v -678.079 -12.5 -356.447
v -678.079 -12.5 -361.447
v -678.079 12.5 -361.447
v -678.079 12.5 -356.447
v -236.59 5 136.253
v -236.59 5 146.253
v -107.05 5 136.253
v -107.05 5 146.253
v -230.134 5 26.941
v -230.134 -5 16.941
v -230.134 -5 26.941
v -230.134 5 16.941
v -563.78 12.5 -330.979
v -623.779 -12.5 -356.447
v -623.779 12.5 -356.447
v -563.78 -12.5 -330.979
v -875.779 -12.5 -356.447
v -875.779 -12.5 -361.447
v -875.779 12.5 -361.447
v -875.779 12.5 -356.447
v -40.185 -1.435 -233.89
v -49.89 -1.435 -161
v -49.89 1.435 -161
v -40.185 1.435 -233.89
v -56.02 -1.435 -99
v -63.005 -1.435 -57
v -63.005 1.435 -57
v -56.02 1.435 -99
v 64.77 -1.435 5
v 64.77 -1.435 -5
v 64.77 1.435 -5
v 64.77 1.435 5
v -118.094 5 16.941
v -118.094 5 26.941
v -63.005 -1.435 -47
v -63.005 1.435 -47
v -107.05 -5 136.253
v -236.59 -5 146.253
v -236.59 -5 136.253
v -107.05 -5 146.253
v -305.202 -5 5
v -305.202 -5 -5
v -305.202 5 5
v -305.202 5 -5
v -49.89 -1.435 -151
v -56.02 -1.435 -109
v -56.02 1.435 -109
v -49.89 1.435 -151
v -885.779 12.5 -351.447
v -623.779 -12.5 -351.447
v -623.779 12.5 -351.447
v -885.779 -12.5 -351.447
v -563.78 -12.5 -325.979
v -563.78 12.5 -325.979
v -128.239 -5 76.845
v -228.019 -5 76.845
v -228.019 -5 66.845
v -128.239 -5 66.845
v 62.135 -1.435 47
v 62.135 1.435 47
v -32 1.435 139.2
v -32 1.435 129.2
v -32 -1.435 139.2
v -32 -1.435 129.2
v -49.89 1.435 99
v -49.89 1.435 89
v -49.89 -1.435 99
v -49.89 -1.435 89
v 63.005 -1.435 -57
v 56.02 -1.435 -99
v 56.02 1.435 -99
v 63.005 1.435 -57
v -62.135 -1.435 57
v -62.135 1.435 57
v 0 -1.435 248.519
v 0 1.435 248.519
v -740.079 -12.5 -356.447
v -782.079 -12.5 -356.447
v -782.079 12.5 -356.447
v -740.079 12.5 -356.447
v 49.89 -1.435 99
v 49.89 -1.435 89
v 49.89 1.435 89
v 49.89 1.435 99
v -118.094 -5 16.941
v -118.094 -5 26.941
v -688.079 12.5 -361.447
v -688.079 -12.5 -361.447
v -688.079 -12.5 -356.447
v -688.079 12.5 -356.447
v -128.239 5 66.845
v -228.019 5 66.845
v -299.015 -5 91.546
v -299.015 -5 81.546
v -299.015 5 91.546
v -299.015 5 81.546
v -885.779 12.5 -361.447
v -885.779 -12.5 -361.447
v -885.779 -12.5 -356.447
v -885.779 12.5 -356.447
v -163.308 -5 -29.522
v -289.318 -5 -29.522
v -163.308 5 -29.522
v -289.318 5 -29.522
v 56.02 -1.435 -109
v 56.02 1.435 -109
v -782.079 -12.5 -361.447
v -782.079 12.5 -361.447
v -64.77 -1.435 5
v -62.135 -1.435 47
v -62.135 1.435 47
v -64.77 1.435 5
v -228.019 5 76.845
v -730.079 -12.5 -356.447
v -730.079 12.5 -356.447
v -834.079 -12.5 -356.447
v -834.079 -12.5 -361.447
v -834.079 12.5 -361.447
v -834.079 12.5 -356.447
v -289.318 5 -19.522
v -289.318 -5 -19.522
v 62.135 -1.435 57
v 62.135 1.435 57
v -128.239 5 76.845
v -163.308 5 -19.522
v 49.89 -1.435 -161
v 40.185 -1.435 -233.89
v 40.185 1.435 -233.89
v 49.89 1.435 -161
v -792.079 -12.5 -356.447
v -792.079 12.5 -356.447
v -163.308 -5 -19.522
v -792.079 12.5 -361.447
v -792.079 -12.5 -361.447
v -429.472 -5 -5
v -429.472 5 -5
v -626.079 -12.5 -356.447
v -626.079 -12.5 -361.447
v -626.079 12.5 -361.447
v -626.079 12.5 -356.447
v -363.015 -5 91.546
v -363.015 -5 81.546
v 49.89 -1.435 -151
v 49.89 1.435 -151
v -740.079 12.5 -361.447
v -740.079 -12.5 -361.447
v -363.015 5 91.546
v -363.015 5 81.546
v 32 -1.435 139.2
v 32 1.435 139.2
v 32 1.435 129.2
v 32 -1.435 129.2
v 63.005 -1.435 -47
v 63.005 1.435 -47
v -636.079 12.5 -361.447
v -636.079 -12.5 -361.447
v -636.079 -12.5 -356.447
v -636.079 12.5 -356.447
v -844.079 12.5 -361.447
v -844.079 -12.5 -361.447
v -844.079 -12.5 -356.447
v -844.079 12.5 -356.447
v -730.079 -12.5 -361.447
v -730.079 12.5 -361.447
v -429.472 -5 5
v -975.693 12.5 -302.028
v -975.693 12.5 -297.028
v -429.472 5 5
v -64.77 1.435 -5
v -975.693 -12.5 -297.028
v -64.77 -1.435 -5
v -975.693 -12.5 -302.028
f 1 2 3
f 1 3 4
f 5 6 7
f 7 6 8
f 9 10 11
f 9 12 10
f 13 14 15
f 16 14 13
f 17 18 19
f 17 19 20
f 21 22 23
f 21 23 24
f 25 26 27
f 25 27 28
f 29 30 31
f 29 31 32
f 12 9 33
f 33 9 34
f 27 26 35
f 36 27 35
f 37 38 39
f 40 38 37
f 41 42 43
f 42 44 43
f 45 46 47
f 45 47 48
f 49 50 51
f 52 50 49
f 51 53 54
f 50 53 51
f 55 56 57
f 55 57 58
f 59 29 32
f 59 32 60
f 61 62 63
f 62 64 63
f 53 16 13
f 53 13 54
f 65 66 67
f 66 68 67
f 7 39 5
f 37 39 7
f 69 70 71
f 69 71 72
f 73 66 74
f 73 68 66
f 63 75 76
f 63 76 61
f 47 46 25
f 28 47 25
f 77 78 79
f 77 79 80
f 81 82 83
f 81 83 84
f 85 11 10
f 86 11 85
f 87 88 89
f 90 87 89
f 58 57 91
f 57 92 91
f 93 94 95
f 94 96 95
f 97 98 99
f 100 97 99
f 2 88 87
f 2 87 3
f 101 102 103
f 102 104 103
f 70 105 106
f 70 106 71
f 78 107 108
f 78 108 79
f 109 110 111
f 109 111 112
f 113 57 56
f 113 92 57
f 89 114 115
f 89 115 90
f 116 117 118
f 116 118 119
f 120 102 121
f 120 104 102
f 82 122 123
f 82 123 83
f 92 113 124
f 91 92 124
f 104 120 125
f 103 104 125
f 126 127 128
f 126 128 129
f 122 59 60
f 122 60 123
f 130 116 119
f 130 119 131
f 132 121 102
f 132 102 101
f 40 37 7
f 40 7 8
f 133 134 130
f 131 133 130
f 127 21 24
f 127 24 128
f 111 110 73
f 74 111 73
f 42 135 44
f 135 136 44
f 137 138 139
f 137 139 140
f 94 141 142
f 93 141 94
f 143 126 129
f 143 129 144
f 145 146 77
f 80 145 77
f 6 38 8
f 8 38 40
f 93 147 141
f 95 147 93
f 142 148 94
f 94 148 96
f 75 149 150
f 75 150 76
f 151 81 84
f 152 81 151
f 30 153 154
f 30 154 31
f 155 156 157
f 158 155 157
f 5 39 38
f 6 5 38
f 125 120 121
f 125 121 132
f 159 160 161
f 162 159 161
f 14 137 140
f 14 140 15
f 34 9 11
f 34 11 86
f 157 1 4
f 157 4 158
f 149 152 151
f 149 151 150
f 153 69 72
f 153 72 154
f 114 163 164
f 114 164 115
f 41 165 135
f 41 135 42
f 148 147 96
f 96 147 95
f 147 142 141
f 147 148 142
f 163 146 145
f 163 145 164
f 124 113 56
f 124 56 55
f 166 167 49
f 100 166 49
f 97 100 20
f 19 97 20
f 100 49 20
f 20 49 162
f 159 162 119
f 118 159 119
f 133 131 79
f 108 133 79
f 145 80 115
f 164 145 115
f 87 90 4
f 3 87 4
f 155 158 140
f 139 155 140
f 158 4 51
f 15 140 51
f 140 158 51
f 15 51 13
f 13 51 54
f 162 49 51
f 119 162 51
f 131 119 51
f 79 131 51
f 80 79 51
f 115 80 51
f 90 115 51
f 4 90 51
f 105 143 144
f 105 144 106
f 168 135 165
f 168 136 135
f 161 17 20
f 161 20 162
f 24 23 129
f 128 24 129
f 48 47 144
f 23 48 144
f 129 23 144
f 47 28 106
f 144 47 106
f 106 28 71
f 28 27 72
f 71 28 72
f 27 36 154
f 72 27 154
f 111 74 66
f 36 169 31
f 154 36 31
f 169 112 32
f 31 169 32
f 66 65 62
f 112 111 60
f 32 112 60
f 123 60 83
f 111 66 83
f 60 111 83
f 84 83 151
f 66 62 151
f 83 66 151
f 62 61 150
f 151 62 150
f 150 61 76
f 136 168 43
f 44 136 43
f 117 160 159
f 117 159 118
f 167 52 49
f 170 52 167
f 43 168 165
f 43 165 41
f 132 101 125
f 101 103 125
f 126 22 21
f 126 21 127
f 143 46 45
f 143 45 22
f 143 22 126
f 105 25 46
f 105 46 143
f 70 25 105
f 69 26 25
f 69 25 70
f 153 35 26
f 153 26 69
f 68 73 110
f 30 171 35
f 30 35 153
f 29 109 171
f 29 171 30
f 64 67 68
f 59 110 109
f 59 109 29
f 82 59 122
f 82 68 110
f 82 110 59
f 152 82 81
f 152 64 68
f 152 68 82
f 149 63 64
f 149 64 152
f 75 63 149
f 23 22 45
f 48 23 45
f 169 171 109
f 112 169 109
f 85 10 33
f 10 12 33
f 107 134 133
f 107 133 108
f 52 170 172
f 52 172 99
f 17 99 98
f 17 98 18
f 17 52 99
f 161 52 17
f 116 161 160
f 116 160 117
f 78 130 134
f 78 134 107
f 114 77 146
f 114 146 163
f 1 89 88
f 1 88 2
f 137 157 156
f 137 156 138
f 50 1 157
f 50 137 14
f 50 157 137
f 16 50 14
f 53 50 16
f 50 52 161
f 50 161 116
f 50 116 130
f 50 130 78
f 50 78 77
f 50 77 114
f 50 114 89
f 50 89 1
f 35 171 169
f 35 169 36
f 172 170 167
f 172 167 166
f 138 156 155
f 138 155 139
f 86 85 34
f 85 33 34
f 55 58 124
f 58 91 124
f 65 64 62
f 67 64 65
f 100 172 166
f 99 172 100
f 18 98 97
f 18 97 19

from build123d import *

# Parameters (mm, degrees)
F0_W     = 126.01
F0_H     = 10
F0_W_2   = 64
F0_W_3   = 124.27
F0_W_4   = 112.04
F0_W_5   = 99.78
F0_W_6   = 129.54
F1_DEPTH = 5
F2_DEPTH = 1.435
F0_W_7   = 10
F0_H_2   = 5
F3_DEPTH = 12.5


with BuildPart() as f1:
    # F0 (on Front) → F1 (new body, symmetric)
    with BuildSketch(Plane.XZ):
        with Locations((-226.313189, -24.522368)):
            Rectangle(F0_W, F0_H)
        with Locations((-331.014579, 86.545763)):
            Rectangle(F0_W_2, F0_H)
        with Locations((-367.336839, 0)):
            Rectangle(F0_W_3, F0_H)
        with Locations((-174.114093, 21.940574)):
            Rectangle(F0_W_4, F0_H)
        with Locations((-178.129405, 71.845211)):
            Rectangle(F0_W_5, F0_H)
        with Locations((-171.819627, 141.252816)):
            Rectangle(F0_W_6, F0_H)
    extrude(amount=F1_DEPTH, both=True)


with BuildPart() as f2:
    # F0 (on Front) → F2 (new body, symmetric)
    with BuildSketch(Plane.XZ):
        Polygon((-49.89, 89), (-62.135, 57), (62.135, 57), (49.89, 89), align=None)
        Polygon((0, 248.519108), (-32, 139.2), (32, 139.2), align=None)
        Polygon((-32, 129.2), (-49.89, 99), (49.89, 99), (32, 129.2), align=None)
        with Locations((0, 134.2)):
            Rectangle(F0_W_2, F0_H)
        with Locations((0, 94)):
            Rectangle(F0_W_5, F0_H)
        with Locations((0, 52)):
            Rectangle(F0_W_3, F0_H)
        Polygon((-62.135, 47), (-64.77, 5), (64.77, 5), (62.135, 47), align=None)
        with Locations((0, -52)):
            Rectangle(F0_W, F0_H)
        Polygon((64.77, -5), (-64.77, -5), (-63.005, -47), (63.005, -47), align=None)
        Polygon((63.005, -57), (-63.005, -57), (-56.02, -99), (56.02, -99), align=None)
        Rectangle(F0_W_6, F0_H)
        with Locations((0, -104)):
            Rectangle(F0_W_4, F0_H)
        Polygon((56.02, -109), (-56.02, -109), (-49.89, -151), (49.89, -151), align=None)
        with Locations((0, -156)):
            Rectangle(F0_W_5, F0_H)
        Polygon((49.89, -161), (-49.89, -161), (-40.185, -233.89), (40.185, -233.89), align=None)
    extrude(amount=F2_DEPTH, both=True)


with BuildPart() as f3:
    # F0 (on Front) → F3 (new body, symmetric)
    with BuildSketch(Plane.XZ):
        Polygon((-885.778965, -356.447093), (-885.778965, -351.447093), (-975.69295, -297.027561), (-975.69295, -302.027561), align=None)
        with Locations((-880.778965, -358.947093)):
            Rectangle(F0_W_7, F0_H_2)
        Polygon((-782.078965, -356.447093), (-754.778965, -356.447093), (-754.778965, -351.447093), (-885.778965, -351.447093), (-885.778965, -356.447093), (-875.778965, -356.447093), (-844.078965, -356.447093), (-834.078965, -356.447093), (-792.078965, -356.447093), align=None)
        with Locations((-839.078965, -358.947093)):
            Rectangle(F0_W_7, F0_H_2)
        with Locations((-787.078965, -358.947093)):
            Rectangle(F0_W_7, F0_H_2)
        with Locations((-735.078965, -358.947093)):
            Rectangle(F0_W_7, F0_H_2)
        with Locations((-683.078965, -358.947093)):
            Rectangle(F0_W_7, F0_H_2)
        with Locations((-631.078965, -358.947093)):
            Rectangle(F0_W_7, F0_H_2)
        Polygon((-754.778965, -351.447093), (-754.778965, -356.447093), (-740.078965, -356.447093), (-730.078965, -356.447093), (-688.078965, -356.447093), (-678.078965, -356.447093), (-636.078965, -356.447093), (-626.078965, -356.447093), (-623.778965, -356.447093), (-623.778965, -351.447093), align=None)
        Polygon((-563.780459, -325.979238), (-623.778965, -351.447093), (-623.778965, -356.447093), (-563.780459, -330.979238), align=None)
    extrude(amount=F3_DEPTH, both=True)


solid = Compound([f1.part, f2.part, f3.part])
